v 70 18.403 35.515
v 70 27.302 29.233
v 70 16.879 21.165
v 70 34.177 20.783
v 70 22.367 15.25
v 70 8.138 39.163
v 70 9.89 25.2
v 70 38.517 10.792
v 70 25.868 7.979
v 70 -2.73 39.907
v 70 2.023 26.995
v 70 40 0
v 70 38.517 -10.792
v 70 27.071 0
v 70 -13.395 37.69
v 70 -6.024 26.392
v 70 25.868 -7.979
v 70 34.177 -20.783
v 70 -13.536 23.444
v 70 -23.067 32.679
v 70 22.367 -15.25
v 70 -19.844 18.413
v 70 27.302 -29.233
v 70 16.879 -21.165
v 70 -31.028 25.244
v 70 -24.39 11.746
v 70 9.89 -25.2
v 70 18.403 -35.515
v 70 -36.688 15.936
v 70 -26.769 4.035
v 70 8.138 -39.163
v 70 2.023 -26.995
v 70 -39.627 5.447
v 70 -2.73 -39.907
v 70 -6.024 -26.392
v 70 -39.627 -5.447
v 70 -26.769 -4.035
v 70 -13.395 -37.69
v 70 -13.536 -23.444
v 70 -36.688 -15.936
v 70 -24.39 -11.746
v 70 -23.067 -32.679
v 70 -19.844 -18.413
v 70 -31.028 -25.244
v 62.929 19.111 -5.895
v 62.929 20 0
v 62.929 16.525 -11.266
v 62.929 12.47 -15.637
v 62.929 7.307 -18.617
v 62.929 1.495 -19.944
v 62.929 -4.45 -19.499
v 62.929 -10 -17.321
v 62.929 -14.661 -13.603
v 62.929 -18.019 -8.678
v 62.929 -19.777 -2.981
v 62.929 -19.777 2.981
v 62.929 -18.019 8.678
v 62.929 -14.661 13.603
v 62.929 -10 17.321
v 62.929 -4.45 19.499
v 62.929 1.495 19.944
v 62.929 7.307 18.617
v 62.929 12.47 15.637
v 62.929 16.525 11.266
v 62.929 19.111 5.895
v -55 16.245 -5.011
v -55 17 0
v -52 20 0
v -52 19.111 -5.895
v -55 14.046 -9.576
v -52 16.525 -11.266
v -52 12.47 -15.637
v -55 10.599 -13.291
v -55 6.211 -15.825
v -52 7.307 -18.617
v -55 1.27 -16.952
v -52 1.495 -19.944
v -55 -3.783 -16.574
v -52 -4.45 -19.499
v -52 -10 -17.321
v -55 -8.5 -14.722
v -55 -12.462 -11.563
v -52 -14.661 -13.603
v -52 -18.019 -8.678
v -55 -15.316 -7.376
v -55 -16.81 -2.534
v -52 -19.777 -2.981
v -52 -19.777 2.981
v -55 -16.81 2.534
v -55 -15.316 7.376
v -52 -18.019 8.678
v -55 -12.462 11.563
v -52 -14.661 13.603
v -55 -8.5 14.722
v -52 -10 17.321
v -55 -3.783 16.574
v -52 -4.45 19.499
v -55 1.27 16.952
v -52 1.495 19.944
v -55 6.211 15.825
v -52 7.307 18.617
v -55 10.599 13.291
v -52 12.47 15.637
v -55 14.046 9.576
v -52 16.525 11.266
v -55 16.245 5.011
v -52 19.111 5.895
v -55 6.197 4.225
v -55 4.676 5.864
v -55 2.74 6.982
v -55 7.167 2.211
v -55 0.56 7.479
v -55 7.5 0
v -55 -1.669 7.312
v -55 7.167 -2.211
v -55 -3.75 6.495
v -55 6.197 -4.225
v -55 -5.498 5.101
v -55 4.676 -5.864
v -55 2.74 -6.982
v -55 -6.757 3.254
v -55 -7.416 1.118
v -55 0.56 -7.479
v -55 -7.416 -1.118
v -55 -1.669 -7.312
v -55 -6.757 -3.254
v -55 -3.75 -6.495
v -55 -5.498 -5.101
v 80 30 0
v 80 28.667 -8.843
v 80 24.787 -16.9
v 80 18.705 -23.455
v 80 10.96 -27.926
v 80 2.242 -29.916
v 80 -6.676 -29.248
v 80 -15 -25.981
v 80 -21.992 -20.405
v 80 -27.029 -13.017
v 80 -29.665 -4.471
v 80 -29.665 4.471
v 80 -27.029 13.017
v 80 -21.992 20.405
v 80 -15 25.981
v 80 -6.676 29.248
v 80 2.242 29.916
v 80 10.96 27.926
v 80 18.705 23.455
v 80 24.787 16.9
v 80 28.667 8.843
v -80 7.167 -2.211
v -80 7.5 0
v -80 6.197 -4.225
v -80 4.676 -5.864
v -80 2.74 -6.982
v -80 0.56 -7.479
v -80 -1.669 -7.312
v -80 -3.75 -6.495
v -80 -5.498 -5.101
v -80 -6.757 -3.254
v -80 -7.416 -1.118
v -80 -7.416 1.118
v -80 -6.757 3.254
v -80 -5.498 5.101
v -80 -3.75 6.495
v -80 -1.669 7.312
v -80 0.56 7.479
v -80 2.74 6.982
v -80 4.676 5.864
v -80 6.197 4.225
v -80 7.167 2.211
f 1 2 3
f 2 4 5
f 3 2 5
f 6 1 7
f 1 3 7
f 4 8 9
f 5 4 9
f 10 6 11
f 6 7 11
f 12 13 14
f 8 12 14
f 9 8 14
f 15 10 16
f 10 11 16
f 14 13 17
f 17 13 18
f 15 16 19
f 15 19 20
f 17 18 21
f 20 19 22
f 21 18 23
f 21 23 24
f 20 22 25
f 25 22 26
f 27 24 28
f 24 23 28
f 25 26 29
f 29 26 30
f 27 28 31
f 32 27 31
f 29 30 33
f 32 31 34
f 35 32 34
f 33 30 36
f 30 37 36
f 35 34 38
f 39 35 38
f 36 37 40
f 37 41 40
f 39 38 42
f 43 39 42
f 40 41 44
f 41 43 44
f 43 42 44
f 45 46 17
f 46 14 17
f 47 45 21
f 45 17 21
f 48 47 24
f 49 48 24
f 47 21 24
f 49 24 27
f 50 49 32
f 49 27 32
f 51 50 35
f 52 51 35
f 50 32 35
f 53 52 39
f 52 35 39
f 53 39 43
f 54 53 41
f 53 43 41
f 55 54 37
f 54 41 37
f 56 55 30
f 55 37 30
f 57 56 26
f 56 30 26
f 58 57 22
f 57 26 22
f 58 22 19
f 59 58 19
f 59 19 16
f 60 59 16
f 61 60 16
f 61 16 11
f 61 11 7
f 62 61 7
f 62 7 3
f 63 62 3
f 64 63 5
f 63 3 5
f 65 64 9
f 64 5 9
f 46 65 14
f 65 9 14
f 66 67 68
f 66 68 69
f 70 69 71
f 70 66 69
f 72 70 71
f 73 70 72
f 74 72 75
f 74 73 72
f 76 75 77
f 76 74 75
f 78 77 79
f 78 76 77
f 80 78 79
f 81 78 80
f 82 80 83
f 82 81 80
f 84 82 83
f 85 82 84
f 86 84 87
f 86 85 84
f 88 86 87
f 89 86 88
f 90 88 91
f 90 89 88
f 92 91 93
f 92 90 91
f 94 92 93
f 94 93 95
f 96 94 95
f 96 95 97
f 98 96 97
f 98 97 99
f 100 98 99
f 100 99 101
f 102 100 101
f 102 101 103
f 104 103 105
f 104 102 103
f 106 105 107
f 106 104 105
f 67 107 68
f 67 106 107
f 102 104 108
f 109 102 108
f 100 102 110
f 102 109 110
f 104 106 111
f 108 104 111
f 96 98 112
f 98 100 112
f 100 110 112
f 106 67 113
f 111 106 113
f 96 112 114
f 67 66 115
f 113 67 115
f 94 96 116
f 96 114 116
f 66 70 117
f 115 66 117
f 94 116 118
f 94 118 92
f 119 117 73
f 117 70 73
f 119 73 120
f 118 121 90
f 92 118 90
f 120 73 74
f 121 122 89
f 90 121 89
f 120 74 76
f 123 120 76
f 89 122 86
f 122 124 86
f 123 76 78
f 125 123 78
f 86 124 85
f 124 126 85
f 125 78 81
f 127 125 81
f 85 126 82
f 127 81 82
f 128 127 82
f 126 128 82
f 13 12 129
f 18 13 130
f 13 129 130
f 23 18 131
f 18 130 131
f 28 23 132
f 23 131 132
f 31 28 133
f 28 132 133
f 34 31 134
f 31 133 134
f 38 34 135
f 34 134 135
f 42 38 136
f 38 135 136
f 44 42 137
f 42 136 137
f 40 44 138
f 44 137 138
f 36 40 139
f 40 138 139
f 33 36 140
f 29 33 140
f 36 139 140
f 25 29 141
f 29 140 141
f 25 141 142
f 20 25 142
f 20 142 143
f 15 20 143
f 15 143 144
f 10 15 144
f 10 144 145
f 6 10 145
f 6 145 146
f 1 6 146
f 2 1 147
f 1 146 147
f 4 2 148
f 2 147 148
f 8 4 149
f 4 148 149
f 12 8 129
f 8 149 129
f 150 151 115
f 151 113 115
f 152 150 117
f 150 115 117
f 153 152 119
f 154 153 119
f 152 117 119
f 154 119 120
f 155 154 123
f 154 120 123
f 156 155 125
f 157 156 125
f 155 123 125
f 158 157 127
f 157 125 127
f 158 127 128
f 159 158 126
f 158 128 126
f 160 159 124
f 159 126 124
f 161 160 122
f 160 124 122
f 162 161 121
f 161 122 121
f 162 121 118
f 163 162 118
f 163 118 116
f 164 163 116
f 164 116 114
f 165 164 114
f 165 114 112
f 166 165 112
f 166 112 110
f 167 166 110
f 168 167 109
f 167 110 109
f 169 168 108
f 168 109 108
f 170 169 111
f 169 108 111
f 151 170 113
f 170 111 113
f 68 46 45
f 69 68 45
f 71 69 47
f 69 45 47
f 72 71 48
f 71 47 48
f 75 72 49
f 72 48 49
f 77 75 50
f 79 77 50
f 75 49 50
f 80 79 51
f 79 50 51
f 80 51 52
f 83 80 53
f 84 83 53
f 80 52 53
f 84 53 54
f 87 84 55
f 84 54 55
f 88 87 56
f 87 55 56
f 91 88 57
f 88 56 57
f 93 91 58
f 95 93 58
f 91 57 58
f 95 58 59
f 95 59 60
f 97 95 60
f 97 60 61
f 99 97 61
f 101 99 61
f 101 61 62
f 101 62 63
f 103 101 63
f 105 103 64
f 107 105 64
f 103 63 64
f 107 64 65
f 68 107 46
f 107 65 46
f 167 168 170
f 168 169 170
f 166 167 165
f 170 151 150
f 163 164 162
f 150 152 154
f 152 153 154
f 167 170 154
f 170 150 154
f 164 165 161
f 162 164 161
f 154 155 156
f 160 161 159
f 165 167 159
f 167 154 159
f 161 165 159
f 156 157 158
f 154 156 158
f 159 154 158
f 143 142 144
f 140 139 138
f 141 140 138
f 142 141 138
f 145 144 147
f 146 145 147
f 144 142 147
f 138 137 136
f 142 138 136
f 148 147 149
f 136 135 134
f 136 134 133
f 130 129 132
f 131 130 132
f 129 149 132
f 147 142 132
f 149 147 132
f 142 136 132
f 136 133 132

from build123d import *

# Parameters (mm, degrees)
CHAMFER1_SIZE = 10
CHAMFER2_SIZE = 3


with BuildPart() as part:
    # Sketch1 → Revolve1 (revolve)
    with BuildSketch(Plane.XY):
        Polygon((-80, 0), (-80, 7.5), (-55, 7.5), (-55, 20), (62.928932188, 20), (70, 27.071067812), (70, 40), (80, 40), (80, 0), align=None)
    revolve(axis=Axis((80, 0, 0), (-1, 0, 0)))

    # Chamfer1
    chamfer1_edges = [part.edges().sort_by_distance(p)[0] for p in [
        (80, -40, 0),
    ]]
    chamfer(chamfer1_edges, length=CHAMFER1_SIZE - 0.0001)  # a hair under: the kernel refuses the full size

    # Chamfer2
    chamfer2_edges = [part.edges().sort_by_distance(p)[0] for p in [
        (-55, -20, 0),
    ]]
    chamfer(chamfer2_edges, length=CHAMFER2_SIZE)


solid = part.part
